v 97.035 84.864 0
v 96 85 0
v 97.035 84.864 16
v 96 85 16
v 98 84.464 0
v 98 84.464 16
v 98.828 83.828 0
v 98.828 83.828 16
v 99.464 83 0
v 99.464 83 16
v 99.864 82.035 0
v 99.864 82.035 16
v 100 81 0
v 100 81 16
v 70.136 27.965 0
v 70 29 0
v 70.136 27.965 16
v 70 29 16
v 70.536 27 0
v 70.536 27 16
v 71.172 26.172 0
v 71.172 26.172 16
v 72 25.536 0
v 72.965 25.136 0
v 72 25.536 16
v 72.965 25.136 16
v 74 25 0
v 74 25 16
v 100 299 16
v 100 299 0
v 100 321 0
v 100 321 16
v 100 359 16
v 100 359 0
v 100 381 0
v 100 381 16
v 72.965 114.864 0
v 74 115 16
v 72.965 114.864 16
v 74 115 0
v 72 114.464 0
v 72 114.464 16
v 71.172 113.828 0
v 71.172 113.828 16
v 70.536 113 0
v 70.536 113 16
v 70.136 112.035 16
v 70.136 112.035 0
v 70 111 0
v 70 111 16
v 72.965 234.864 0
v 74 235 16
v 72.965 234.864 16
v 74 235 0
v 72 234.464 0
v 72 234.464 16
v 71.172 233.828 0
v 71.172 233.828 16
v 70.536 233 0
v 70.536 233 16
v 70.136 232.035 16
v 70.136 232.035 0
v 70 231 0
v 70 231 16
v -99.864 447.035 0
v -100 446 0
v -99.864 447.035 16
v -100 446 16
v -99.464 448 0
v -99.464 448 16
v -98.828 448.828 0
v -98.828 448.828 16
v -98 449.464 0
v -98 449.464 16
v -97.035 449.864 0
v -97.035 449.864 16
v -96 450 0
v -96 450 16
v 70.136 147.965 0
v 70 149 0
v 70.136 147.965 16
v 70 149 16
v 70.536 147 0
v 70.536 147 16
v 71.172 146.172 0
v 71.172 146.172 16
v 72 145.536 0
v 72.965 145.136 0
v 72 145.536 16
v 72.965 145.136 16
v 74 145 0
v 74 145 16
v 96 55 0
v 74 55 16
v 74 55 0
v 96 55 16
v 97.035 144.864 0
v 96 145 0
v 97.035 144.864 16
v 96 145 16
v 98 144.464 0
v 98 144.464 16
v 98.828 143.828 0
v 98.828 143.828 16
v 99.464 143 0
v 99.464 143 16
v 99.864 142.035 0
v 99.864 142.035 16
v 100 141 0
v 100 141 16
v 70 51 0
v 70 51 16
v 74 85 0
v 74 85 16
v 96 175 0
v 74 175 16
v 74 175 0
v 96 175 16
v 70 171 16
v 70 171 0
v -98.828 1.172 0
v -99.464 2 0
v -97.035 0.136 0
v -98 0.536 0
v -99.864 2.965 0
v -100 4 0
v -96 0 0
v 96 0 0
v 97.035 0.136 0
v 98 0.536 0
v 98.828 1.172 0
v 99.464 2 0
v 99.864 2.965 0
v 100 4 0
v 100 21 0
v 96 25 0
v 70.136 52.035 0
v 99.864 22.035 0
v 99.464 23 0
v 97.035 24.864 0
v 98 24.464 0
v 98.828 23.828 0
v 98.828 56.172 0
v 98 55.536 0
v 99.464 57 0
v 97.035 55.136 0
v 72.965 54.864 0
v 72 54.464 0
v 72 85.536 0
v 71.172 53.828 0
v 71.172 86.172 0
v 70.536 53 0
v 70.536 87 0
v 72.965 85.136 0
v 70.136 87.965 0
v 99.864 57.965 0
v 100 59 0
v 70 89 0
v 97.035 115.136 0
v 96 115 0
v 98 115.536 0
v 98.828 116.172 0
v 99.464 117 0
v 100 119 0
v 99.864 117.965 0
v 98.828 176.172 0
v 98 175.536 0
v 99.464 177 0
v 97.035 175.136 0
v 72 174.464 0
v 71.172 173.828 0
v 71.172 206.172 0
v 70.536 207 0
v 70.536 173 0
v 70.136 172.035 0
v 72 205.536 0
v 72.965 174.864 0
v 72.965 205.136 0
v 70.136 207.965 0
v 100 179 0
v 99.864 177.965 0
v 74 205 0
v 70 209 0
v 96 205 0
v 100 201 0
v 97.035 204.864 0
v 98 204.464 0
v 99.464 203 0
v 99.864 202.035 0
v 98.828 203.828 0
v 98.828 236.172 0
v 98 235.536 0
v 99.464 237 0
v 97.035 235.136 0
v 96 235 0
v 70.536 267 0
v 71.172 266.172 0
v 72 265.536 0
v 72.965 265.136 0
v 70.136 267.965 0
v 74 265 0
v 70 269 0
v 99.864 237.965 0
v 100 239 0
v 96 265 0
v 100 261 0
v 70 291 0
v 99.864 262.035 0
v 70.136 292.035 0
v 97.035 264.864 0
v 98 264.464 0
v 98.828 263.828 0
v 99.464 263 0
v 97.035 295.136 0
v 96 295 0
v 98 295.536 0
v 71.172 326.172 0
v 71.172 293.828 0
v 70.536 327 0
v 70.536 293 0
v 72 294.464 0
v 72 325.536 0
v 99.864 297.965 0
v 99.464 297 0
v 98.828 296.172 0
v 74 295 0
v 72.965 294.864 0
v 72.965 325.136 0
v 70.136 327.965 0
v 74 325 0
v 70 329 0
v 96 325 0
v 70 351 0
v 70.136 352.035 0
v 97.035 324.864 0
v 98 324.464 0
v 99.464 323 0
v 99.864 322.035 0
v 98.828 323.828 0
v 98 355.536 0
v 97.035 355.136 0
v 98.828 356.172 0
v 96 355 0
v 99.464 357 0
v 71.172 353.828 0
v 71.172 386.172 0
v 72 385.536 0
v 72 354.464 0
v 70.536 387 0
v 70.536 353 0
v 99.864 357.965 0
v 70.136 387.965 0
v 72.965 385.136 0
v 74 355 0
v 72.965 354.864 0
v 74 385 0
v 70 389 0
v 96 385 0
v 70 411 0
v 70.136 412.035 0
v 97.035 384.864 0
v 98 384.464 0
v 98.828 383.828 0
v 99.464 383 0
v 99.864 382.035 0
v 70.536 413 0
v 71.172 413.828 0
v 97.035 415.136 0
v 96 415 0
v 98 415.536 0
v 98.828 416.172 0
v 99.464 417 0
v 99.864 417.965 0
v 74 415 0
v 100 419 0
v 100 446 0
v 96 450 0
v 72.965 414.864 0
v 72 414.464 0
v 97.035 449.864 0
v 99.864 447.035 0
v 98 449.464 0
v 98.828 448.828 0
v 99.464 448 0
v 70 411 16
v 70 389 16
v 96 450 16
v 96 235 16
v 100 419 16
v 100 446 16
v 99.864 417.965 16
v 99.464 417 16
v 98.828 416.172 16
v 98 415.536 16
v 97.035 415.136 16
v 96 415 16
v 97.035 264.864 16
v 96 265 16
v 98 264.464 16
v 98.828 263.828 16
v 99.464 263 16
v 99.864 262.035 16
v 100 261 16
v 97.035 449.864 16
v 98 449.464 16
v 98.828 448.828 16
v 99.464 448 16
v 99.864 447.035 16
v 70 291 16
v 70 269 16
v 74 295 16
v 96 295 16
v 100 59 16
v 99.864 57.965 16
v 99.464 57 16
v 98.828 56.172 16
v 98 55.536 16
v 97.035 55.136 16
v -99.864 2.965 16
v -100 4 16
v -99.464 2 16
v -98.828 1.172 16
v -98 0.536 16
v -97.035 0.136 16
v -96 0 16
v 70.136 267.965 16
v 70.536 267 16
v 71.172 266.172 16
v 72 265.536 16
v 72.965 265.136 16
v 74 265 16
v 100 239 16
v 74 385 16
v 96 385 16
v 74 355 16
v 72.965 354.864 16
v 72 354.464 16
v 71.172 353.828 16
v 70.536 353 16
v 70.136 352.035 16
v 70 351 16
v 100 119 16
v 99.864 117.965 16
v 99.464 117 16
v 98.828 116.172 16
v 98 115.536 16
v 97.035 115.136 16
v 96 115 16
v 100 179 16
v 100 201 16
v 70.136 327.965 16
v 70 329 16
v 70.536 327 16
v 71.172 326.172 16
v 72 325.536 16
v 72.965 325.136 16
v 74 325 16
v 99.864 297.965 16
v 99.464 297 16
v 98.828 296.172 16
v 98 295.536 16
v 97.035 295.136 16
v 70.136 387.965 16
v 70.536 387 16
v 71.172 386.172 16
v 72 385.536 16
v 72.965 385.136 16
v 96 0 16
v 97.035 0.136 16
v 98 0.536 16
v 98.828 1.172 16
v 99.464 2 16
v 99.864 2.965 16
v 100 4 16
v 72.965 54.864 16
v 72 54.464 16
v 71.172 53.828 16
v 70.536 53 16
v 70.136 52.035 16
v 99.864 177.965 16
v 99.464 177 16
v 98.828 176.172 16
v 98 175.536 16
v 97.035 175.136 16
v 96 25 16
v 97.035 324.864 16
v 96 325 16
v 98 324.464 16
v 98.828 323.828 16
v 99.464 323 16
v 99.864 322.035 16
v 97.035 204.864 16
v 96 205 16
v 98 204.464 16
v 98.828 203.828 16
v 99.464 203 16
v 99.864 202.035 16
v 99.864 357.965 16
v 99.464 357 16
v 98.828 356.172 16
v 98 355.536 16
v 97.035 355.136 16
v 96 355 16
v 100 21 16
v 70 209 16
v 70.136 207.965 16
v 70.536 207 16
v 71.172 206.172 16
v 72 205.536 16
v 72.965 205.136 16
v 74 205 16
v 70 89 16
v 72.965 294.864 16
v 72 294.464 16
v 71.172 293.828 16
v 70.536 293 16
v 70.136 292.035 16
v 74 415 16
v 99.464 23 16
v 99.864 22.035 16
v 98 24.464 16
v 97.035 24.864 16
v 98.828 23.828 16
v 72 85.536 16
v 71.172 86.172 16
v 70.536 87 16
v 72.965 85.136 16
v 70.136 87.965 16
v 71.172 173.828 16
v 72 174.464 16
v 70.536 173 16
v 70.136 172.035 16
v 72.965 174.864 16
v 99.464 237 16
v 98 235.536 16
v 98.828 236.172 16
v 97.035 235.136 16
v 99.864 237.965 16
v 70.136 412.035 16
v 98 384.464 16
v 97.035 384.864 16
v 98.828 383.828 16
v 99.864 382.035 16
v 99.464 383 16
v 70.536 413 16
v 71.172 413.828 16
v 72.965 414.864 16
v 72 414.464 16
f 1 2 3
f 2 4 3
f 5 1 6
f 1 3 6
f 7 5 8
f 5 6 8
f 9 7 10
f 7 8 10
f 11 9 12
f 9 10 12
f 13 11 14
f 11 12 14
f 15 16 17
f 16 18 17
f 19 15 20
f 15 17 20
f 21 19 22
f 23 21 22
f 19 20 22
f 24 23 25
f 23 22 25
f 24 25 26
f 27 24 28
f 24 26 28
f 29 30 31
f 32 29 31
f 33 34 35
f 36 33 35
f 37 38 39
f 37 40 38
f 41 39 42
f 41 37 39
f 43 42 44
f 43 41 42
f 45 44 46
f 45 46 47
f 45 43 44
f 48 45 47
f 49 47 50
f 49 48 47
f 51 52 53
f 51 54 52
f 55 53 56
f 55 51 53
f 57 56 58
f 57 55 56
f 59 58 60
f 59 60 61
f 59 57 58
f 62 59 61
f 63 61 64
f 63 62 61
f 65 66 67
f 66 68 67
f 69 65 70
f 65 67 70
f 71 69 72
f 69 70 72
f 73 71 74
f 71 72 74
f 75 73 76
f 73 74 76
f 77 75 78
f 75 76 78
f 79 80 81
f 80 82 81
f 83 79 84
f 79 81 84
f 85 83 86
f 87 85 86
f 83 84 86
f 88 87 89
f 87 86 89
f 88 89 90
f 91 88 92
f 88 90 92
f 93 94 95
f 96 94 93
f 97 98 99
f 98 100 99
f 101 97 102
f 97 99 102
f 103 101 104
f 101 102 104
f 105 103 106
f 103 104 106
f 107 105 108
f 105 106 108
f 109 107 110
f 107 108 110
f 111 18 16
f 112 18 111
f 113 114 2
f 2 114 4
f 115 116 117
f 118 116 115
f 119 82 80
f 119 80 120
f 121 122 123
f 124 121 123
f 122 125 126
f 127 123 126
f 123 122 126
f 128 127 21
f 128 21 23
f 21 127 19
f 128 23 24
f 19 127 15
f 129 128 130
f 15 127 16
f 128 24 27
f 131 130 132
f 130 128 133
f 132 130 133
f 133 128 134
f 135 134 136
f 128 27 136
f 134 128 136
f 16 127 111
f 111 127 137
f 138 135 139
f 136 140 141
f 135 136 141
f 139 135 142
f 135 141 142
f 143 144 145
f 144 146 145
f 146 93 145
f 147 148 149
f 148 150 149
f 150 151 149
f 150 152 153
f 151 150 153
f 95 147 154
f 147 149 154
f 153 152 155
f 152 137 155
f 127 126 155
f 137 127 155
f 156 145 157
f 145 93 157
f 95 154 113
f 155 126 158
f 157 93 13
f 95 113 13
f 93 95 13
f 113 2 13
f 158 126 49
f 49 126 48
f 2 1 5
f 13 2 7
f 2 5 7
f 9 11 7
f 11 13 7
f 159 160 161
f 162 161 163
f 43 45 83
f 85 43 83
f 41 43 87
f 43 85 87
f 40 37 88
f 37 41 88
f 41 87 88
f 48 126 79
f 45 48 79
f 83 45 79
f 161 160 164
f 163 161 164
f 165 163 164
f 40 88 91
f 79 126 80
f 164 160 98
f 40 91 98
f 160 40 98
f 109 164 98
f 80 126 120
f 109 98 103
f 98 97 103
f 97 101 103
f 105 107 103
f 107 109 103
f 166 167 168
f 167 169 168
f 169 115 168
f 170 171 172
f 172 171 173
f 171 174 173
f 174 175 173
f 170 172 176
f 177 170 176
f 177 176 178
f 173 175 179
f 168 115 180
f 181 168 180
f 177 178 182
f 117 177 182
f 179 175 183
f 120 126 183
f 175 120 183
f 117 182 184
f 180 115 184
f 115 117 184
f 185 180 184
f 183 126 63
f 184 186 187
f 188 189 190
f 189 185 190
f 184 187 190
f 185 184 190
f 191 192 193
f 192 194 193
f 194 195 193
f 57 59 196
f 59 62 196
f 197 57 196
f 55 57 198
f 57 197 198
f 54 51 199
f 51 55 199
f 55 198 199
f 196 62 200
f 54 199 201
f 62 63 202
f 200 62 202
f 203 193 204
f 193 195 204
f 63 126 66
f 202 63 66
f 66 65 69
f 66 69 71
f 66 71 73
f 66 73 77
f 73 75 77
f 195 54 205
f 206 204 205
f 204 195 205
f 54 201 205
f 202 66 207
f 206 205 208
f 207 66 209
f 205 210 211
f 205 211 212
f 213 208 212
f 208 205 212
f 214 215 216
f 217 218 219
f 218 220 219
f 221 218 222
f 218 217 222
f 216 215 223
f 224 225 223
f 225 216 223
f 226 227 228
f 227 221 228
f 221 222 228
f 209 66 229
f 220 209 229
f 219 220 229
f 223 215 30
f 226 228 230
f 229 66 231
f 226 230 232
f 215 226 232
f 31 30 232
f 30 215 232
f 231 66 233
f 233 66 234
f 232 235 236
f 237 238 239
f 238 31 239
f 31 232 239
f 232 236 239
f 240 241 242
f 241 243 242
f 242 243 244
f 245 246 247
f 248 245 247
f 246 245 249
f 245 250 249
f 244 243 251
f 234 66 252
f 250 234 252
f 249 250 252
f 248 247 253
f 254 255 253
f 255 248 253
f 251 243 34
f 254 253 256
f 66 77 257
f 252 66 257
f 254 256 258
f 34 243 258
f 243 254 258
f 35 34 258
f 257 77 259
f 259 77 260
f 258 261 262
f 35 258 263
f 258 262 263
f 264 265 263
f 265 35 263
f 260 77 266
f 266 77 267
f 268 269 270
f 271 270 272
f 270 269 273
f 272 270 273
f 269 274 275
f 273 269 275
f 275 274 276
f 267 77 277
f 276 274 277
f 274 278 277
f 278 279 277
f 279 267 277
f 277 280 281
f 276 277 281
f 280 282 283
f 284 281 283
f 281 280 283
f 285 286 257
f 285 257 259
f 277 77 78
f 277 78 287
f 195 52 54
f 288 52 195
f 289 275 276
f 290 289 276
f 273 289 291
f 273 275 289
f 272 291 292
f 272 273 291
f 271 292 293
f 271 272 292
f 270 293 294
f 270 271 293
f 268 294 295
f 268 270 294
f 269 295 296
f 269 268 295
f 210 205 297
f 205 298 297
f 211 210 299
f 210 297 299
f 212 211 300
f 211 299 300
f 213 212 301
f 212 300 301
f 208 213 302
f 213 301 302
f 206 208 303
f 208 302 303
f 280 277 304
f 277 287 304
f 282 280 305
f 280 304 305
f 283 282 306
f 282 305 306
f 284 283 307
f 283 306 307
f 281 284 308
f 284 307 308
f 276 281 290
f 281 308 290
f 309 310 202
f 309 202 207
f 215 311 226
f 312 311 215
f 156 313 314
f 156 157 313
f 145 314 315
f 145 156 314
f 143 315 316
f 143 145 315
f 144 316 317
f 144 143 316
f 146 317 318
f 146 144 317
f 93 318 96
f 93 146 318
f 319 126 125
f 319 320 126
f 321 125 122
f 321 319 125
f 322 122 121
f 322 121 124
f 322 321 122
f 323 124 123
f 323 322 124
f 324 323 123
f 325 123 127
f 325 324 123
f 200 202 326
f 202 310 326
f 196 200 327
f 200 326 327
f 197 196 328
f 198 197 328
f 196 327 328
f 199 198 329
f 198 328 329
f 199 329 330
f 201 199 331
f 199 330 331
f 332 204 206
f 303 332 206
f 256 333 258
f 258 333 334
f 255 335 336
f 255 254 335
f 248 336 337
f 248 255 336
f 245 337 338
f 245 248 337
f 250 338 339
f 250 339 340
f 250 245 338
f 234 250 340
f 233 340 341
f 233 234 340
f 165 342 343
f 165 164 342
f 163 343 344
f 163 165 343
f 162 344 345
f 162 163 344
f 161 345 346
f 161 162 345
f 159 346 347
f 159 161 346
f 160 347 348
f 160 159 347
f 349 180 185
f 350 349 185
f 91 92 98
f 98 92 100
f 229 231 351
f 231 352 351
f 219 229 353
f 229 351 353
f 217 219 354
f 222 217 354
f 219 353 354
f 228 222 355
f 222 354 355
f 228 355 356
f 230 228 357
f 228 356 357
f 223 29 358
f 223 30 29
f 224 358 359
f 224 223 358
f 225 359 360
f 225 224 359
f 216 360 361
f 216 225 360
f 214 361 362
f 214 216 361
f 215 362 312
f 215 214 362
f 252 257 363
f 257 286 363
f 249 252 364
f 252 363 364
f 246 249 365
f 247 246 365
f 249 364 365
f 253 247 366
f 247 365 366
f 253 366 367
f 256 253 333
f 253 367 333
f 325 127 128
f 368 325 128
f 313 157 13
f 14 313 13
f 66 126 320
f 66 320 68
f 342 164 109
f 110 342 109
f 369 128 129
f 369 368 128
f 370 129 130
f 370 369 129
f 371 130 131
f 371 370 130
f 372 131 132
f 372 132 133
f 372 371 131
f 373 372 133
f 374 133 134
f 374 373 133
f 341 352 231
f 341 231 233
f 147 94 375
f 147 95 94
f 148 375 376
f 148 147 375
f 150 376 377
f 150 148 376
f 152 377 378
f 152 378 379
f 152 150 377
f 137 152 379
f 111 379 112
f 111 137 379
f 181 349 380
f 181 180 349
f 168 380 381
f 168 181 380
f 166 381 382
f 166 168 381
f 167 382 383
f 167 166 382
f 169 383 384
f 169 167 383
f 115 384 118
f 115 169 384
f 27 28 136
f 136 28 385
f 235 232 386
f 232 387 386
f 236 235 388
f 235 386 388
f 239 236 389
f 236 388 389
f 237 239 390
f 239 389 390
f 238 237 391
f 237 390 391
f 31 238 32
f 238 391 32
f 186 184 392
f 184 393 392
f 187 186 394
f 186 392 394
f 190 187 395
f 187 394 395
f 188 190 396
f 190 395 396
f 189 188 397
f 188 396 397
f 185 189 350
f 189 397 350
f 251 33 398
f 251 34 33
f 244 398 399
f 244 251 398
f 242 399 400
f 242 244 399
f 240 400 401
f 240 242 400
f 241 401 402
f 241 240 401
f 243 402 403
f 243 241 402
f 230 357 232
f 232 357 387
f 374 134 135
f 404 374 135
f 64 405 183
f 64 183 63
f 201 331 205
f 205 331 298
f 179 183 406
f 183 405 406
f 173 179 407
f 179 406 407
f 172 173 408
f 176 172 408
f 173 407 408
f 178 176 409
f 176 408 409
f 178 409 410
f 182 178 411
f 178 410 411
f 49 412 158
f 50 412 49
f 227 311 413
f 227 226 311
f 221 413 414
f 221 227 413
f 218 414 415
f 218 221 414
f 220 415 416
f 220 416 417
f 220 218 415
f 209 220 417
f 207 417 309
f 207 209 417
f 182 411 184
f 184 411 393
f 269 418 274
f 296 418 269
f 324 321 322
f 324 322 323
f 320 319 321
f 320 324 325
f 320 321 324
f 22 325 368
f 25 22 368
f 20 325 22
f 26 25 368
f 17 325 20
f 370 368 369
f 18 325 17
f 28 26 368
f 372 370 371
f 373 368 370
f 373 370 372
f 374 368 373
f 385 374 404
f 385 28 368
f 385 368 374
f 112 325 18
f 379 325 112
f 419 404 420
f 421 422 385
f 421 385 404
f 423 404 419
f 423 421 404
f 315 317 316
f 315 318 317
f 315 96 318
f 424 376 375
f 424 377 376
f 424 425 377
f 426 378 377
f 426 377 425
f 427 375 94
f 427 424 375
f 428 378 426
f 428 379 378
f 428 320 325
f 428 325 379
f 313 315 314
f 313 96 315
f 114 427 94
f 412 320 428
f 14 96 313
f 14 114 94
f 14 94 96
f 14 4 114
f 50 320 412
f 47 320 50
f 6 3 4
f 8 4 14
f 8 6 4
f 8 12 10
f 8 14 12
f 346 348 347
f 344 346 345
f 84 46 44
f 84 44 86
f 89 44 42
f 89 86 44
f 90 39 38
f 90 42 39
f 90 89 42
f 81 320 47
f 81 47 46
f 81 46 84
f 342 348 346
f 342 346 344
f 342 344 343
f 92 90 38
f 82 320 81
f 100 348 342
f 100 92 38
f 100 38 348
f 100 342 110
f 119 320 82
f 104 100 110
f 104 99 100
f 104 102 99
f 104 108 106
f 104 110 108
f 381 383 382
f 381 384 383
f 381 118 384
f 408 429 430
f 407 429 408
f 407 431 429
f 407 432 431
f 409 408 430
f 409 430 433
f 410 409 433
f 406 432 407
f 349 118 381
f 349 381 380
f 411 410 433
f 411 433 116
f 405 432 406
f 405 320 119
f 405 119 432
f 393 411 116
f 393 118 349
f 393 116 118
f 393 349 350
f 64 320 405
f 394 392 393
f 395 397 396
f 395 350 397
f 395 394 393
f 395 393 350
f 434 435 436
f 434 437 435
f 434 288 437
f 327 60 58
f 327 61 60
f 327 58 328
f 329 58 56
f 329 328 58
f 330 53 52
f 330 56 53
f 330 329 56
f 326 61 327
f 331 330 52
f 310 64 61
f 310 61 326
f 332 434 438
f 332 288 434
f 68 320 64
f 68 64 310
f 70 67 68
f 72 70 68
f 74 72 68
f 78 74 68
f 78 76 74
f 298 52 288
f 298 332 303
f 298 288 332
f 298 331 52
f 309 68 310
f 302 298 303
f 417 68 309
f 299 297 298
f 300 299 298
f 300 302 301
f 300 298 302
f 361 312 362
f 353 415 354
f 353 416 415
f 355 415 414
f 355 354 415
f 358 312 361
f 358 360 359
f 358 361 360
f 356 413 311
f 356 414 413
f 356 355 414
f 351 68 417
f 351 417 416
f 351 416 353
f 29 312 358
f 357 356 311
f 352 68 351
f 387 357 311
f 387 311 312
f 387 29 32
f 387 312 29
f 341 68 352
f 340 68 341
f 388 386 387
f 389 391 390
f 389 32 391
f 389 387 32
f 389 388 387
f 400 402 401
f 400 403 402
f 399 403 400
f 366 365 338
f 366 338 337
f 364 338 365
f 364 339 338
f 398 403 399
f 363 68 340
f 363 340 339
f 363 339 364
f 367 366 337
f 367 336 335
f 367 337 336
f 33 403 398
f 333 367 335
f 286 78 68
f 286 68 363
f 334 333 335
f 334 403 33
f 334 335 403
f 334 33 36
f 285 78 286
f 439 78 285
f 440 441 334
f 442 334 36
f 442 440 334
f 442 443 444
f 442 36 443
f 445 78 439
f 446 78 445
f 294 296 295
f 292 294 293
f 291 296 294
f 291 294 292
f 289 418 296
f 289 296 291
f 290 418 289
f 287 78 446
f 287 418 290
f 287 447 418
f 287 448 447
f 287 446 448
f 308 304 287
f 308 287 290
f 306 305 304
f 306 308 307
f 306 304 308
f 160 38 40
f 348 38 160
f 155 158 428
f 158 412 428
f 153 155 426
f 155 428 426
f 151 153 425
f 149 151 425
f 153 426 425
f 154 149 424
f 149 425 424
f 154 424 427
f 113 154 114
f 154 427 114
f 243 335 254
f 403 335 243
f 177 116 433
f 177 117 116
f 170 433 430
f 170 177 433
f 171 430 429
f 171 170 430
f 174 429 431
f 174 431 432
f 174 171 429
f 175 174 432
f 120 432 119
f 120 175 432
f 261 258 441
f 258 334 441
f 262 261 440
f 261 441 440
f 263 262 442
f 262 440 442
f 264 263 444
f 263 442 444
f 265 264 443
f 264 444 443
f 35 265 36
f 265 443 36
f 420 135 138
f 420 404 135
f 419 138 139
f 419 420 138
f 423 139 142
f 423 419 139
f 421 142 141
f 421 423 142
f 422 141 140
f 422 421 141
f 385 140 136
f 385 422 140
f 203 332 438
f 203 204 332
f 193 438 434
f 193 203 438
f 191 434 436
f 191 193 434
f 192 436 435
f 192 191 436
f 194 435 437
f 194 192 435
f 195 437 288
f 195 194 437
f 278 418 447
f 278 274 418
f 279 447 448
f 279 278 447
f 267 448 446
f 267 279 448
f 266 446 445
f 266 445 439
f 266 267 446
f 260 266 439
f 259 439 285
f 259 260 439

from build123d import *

# Parameters (mm, degrees)
SKETCH1_W           = 200
SKETCH1_H           = 450
BOSS_EXTRUDE1_DEPTH = 16
SKETCH2_W           = 30
SKETCH2_H           = 30
CUT_EXTRUDE8_DEPTH  = 462.254810273
LPATTERN1_COUNT     = 7
LPATTERN1_PITCH     = 60
FILLET1_R           = 4


with BuildPart() as part:
    # Sketch1 → Boss-Extrude1 (new body)
    with BuildSketch(Plane.XY):
        with Locations((0, 225)):
            Rectangle(SKETCH1_W, SKETCH1_H)
    extrude(amount=BOSS_EXTRUDE1_DEPTH)

    # Sketch2 → Cut-Extrude8 (cut, symmetric)
    with BuildSketch(Plane.XY.offset(16)):
        with Locations((85, 40)):
            Rectangle(SKETCH2_W, SKETCH2_H)
    cut_extrude8 = extrude(amount=CUT_EXTRUDE8_DEPTH, both=True, mode=Mode.SUBTRACT)

    # LPattern1: Cut-Extrude8 ×7
    with Locations(*[(0, i * LPATTERN1_PITCH, 0) for i in range(1, LPATTERN1_COUNT)]):
        add(cut_extrude8, mode=Mode.SUBTRACT)

    # Fillet1
    fillet1_edges = [part.edges().sort_by_distance(p)[0] for p in [
        (70, 355, 8),
        (100, 355, 8),
        (100, 325, 8),
        (70, 325, 8),
        (70, 415, 8),
        (100, 415, 8),
        (100, 385, 8),
        (70, 385, 8),
        (70, 55, 8),
        (100, 55, 8),
        (100, 25, 8),
        (70, 25, 8),
        (70, 115, 8),
        (100, 115, 8),
        (100, 85, 8),
        (70, 85, 8),
        (70, 175, 8),
        (100, 175, 8),
        (100, 145, 8),
        (70, 145, 8),
        (-100, 450, 8),
        (100, 450, 8),
        (100, 0, 8),
        (-100, 0, 8),
        (70, 235, 8),
        (100, 235, 8),
        (100, 205, 8),
        (70, 205, 8),
        (70, 295, 8),
        (100, 295, 8),
        (100, 265, 8),
        (70, 265, 8),
    ]]
    fillet(fillet1_edges, radius=FILLET1_R)


solid = part.part
